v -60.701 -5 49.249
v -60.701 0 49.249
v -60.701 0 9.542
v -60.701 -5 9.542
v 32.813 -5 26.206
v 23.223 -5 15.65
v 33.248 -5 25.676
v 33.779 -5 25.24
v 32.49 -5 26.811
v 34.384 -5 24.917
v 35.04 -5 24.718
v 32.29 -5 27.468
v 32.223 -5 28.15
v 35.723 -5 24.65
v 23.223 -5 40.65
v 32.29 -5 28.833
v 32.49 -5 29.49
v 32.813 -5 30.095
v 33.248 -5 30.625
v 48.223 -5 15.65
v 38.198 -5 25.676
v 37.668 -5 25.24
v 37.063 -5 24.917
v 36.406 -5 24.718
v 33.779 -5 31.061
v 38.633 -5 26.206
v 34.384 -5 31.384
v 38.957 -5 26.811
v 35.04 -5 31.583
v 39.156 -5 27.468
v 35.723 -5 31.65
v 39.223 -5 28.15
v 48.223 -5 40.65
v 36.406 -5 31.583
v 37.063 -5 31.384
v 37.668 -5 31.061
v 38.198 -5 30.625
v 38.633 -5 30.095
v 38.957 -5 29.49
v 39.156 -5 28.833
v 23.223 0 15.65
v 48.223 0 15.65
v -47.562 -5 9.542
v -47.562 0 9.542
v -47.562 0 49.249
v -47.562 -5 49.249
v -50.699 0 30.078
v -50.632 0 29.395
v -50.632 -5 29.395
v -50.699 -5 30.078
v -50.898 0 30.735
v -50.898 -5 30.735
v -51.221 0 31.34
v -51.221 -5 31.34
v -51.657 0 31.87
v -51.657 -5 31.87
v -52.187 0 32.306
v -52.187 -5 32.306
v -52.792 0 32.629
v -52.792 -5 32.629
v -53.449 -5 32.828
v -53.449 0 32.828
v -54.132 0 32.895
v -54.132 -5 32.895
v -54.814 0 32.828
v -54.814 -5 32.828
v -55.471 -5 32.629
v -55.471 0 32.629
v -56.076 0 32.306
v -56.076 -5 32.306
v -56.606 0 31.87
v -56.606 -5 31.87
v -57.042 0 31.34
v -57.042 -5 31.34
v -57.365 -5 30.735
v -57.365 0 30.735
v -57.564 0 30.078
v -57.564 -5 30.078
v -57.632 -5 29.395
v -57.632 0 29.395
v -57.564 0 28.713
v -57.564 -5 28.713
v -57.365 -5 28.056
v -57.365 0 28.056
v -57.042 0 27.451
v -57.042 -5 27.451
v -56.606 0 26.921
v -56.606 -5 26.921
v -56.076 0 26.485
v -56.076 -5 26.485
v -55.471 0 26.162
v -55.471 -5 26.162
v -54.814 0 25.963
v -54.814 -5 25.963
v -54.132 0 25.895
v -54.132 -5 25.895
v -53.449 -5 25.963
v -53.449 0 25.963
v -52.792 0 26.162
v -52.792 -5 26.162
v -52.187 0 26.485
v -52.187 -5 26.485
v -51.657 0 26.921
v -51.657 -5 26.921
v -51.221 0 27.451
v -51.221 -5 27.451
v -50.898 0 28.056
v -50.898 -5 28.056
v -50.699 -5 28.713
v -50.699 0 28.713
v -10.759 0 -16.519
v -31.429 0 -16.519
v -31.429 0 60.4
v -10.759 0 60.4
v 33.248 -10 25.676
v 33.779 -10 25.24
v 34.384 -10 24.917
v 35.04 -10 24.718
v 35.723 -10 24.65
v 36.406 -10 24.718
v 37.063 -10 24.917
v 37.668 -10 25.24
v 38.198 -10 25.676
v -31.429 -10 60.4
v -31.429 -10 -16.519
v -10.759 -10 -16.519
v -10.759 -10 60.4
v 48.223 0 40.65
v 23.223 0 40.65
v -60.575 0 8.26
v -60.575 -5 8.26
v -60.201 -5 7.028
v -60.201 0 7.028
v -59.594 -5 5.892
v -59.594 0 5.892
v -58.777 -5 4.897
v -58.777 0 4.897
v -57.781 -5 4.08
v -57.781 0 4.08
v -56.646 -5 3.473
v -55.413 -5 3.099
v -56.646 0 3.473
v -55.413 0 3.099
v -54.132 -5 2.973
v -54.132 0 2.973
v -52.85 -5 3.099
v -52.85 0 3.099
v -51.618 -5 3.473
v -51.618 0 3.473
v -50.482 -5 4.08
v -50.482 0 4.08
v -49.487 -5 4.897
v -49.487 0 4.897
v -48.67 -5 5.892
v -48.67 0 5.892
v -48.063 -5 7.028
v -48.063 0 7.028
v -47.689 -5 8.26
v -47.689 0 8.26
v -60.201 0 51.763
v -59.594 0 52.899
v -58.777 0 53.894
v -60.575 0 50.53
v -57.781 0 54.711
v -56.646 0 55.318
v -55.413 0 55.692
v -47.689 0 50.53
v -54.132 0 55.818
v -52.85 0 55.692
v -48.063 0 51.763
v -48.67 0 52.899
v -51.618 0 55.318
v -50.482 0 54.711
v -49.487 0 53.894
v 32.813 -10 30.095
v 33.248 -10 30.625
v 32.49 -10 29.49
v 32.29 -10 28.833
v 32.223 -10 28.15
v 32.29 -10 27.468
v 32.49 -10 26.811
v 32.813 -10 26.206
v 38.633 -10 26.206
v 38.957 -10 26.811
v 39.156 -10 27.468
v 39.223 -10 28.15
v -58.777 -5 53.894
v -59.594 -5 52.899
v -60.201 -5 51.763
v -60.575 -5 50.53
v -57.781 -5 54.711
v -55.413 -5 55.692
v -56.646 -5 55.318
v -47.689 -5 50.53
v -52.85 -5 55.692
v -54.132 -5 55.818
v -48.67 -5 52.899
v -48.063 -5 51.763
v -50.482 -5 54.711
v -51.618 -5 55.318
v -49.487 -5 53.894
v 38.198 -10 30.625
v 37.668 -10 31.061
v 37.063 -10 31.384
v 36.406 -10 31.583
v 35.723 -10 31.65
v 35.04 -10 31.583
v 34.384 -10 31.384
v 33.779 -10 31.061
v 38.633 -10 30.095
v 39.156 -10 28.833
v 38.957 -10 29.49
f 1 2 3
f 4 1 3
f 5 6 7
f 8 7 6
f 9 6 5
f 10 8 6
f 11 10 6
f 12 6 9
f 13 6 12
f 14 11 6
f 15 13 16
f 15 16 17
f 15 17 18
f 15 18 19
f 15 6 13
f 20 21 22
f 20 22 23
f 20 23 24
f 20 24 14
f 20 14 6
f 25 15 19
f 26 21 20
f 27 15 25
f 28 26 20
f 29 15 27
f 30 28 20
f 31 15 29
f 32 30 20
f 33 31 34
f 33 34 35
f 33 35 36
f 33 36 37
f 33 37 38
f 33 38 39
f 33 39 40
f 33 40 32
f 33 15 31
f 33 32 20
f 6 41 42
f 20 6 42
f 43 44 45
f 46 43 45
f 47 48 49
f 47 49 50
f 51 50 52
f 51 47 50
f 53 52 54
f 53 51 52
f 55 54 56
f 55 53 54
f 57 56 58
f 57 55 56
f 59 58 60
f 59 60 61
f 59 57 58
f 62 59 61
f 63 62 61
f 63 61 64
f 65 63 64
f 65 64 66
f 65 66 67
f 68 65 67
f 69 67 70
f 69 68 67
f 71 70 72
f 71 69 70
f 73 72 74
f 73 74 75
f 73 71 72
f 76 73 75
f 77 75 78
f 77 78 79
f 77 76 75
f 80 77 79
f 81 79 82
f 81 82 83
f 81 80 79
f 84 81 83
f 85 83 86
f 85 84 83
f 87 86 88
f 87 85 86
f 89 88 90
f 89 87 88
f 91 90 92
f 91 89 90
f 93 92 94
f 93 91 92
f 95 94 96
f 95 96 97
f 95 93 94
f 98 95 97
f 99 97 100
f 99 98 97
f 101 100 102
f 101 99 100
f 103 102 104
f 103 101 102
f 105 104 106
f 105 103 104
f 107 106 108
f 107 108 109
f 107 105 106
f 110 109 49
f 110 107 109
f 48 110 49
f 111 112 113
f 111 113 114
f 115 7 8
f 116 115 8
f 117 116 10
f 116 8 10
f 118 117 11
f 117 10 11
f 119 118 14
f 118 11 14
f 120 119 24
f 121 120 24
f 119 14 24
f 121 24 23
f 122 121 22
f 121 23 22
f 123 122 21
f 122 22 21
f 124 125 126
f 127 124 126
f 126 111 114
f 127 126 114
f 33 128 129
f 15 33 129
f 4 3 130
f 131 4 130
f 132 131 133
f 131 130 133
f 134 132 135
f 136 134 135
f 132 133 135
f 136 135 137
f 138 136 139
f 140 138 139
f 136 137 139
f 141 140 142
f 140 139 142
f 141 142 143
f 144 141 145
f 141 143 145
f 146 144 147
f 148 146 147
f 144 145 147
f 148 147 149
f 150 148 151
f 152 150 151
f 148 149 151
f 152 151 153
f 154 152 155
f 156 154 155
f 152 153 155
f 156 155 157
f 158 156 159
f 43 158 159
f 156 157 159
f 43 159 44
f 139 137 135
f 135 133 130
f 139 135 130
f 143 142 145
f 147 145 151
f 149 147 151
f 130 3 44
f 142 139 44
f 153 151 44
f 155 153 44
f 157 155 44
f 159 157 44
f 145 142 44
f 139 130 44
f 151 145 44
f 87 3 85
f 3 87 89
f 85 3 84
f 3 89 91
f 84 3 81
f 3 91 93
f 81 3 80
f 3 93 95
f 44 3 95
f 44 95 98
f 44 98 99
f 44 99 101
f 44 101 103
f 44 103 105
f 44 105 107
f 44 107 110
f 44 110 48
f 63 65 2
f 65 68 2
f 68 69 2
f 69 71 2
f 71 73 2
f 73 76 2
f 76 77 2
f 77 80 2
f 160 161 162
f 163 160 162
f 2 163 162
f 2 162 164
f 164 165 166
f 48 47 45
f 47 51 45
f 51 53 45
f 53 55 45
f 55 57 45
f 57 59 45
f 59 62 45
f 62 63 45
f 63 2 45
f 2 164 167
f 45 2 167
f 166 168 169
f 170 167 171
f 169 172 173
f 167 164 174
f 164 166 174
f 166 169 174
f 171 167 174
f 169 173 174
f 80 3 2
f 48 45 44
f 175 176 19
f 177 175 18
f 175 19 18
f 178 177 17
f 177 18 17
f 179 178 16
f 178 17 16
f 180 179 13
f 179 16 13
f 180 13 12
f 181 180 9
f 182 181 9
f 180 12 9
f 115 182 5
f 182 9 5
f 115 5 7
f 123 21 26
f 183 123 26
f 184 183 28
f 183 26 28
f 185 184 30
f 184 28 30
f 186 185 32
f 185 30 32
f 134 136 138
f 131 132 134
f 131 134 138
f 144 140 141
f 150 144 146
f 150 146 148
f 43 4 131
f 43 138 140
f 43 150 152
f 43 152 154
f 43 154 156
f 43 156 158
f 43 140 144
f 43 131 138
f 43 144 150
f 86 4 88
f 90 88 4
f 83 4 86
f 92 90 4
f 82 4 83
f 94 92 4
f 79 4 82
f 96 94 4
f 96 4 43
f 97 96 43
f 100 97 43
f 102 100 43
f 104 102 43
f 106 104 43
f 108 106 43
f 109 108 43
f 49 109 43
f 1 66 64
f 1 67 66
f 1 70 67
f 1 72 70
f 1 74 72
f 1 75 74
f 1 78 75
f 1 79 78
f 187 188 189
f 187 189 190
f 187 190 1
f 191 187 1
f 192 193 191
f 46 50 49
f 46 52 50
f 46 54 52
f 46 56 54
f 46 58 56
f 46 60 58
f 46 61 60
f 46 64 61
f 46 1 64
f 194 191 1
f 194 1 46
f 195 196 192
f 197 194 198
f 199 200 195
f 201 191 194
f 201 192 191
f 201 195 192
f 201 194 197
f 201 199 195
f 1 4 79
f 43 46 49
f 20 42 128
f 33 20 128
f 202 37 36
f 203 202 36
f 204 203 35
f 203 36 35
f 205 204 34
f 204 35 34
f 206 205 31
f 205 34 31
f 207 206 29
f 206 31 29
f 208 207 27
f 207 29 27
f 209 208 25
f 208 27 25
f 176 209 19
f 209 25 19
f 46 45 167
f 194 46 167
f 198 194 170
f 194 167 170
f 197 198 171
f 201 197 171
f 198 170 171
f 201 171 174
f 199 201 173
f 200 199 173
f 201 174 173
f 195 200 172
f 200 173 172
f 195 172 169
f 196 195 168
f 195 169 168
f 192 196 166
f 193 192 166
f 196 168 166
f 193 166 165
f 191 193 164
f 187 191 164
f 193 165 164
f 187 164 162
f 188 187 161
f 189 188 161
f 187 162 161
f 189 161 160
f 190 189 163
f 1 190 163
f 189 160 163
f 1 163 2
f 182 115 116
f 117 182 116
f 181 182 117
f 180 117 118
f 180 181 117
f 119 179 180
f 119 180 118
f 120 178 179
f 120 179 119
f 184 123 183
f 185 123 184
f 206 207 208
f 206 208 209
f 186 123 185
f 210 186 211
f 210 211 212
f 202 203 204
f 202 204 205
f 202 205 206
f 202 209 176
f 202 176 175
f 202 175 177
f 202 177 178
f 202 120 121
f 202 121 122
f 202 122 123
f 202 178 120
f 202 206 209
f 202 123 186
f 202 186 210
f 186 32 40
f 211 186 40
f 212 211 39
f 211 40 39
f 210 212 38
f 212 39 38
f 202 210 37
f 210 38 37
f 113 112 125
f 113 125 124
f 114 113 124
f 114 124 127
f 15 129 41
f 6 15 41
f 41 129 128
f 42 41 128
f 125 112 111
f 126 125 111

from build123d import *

# Parameters (mm, degrees)
F0_R     = 3.5
F1_DEPTH = 5
F2_W     = 20.669978112
F2_H     = 76.9194290042
F3_DEPTH = 10
F5_DEPTH = 5
F6_DEPTH = 10


with BuildPart() as f1:
    # F0 (on Front) → F1 (new body)
    with BuildSketch(Plane.XZ):
        with BuildLine():
            ThreePointArc((-47.562482343, 49.2489182709), (-54.1316252202, 55.8180611481), (-60.7007680973, 49.2489182709))
            Line((-60.7007680973, 49.2489182709), (-60.7007680973, 29.3954196386))
            Line((-60.7007680973, 29.3954196386), (-60.7007680973, 9.5419210063))
            ThreePointArc((-60.7007680973, 9.5419210063), (-54.1316252202, 2.9727781291), (-47.562482343, 9.5419210063))
            Line((-47.562482343, 9.5419210063), (-47.562482343, 49.2489182709))
        make_face()
        with Locations((-54.1316252202, 29.3954196386)):
            Circle(F0_R, mode=Mode.SUBTRACT)
    extrude(amount=F1_DEPTH)


with BuildPart() as f3:
    # F2 (on Front) → F3 (new body)
    with BuildSketch(Plane.XZ):
        with Locations((-21.0935417563, 21.9406746328)):
            Rectangle(F2_W, F2_H)
    extrude(amount=F3_DEPTH)


with BuildPart() as f5:
    # F4 (on Front) → F5 (new body)
    with BuildSketch(Plane.XZ):
        with BuildLine():
            Line((48.2231631423, 40.6504594242), (23.2231631423, 40.6504594242))
            Line((23.2231631423, 40.6504594242), (33.2482894081, 30.6253331583))
            ThreePointArc((33.2482894081, 30.6253331583), (35.7231631423, 31.6504594242), (38.1980368764, 30.6253331583))
            Line((38.1980368764, 30.6253331583), (48.2231631423, 40.6504594242))
        make_face()
        with BuildLine():
            Line((33.2482894081, 30.6253331583), (23.2231631423, 40.6504594242))
            Line((23.2231631423, 40.6504594242), (23.2231631423, 15.6504594242))
            Line((23.2231631423, 15.6504594242), (33.2482894081, 25.67558569))
            ThreePointArc((33.2482894081, 25.67558569), (32.2231631423, 28.1504594242), (33.2482894081, 30.6253331583))
        make_face()
        with BuildLine():
            Line((33.2482894081, 25.67558569), (23.2231631423, 15.6504594242))
            Line((23.2231631423, 15.6504594242), (48.2231631423, 15.6504594242))
            Line((48.2231631423, 15.6504594242), (38.1980368764, 25.67558569))
            ThreePointArc((38.1980368764, 25.67558569), (35.7231631423, 24.6504594242), (33.2482894081, 25.67558569))
        make_face()
        with BuildLine():
            Line((48.2231631423, 15.6504594242), (48.2231631423, 40.6504594242))
            Line((48.2231631423, 40.6504594242), (38.1980368764, 30.6253331583))
            ThreePointArc((38.1980368764, 30.6253331583), (38.9567415061, 29.4898514375), (39.2231631423, 28.1504594242))
            ThreePointArc((39.2231631423, 28.1504594242), (38.9567415061, 26.8110674109), (38.1980368764, 25.67558569))
            Line((38.1980368764, 25.67558569), (48.2231631423, 15.6504594242))
        make_face()
        with BuildLine():
            Line((35.7231631423, 28.1504594242), (33.2482894081, 30.6253331583))
            ThreePointArc((33.2482894081, 30.6253331583), (32.2231631423, 28.1504594242), (33.2482894081, 25.67558569))
            Line((33.2482894081, 25.67558569), (35.7231631423, 28.1504594242))
        make_face()
        with BuildLine():
            ThreePointArc((38.1980368764, 30.6253331583), (35.7231631423, 31.6504594242), (33.2482894081, 30.6253331583))
            Line((33.2482894081, 30.6253331583), (35.7231631423, 28.1504594242))
            Line((35.7231631423, 28.1504594242), (38.1980368764, 30.6253331583))
        make_face()
        with BuildLine():
            ThreePointArc((39.2231631423, 28.1504594242), (38.9567415061, 29.4898514375), (38.1980368764, 30.6253331583))
            Line((38.1980368764, 30.6253331583), (35.7231631423, 28.1504594242))
            Line((35.7231631423, 28.1504594242), (38.1980368764, 25.67558569))
            ThreePointArc((38.1980368764, 25.67558569), (38.9567415061, 26.8110674109), (39.2231631423, 28.1504594242))
        make_face()
        with BuildLine():
            Line((35.7231631423, 28.1504594242), (33.2482894081, 25.67558569))
            ThreePointArc((33.2482894081, 25.67558569), (35.7231631423, 24.6504594242), (38.1980368764, 25.67558569))
            Line((38.1980368764, 25.67558569), (35.7231631423, 28.1504594242))
        make_face()
    extrude(amount=F5_DEPTH)

    # F4 (on Front) → F6 (join)
    with BuildSketch(Plane.XZ):
        with BuildLine():
            ThreePointArc((38.1980368764, 30.6253331583), (35.7231631423, 31.6504594242), (33.2482894081, 30.6253331583))
            Line((33.2482894081, 30.6253331583), (35.7231631423, 28.1504594242))
            Line((35.7231631423, 28.1504594242), (38.1980368764, 30.6253331583))
        make_face()
        with BuildLine():
            ThreePointArc((39.2231631423, 28.1504594242), (38.9567415061, 29.4898514375), (38.1980368764, 30.6253331583))
            Line((38.1980368764, 30.6253331583), (35.7231631423, 28.1504594242))
            Line((35.7231631423, 28.1504594242), (38.1980368764, 25.67558569))
            ThreePointArc((38.1980368764, 25.67558569), (38.9567415061, 26.8110674109), (39.2231631423, 28.1504594242))
        make_face()
        with BuildLine():
            Line((35.7231631423, 28.1504594242), (33.2482894081, 25.67558569))
            ThreePointArc((33.2482894081, 25.67558569), (35.7231631423, 24.6504594242), (38.1980368764, 25.67558569))
            Line((38.1980368764, 25.67558569), (35.7231631423, 28.1504594242))
        make_face()
        with BuildLine():
            Line((35.7231631423, 28.1504594242), (33.2482894081, 30.6253331583))
            ThreePointArc((33.2482894081, 30.6253331583), (32.2231631423, 28.1504594242), (33.2482894081, 25.67558569))
            Line((33.2482894081, 25.67558569), (35.7231631423, 28.1504594242))
        make_face()
    extrude(amount=F6_DEPTH)


solid = Compound([f1.part, f3.part, f5.part])
